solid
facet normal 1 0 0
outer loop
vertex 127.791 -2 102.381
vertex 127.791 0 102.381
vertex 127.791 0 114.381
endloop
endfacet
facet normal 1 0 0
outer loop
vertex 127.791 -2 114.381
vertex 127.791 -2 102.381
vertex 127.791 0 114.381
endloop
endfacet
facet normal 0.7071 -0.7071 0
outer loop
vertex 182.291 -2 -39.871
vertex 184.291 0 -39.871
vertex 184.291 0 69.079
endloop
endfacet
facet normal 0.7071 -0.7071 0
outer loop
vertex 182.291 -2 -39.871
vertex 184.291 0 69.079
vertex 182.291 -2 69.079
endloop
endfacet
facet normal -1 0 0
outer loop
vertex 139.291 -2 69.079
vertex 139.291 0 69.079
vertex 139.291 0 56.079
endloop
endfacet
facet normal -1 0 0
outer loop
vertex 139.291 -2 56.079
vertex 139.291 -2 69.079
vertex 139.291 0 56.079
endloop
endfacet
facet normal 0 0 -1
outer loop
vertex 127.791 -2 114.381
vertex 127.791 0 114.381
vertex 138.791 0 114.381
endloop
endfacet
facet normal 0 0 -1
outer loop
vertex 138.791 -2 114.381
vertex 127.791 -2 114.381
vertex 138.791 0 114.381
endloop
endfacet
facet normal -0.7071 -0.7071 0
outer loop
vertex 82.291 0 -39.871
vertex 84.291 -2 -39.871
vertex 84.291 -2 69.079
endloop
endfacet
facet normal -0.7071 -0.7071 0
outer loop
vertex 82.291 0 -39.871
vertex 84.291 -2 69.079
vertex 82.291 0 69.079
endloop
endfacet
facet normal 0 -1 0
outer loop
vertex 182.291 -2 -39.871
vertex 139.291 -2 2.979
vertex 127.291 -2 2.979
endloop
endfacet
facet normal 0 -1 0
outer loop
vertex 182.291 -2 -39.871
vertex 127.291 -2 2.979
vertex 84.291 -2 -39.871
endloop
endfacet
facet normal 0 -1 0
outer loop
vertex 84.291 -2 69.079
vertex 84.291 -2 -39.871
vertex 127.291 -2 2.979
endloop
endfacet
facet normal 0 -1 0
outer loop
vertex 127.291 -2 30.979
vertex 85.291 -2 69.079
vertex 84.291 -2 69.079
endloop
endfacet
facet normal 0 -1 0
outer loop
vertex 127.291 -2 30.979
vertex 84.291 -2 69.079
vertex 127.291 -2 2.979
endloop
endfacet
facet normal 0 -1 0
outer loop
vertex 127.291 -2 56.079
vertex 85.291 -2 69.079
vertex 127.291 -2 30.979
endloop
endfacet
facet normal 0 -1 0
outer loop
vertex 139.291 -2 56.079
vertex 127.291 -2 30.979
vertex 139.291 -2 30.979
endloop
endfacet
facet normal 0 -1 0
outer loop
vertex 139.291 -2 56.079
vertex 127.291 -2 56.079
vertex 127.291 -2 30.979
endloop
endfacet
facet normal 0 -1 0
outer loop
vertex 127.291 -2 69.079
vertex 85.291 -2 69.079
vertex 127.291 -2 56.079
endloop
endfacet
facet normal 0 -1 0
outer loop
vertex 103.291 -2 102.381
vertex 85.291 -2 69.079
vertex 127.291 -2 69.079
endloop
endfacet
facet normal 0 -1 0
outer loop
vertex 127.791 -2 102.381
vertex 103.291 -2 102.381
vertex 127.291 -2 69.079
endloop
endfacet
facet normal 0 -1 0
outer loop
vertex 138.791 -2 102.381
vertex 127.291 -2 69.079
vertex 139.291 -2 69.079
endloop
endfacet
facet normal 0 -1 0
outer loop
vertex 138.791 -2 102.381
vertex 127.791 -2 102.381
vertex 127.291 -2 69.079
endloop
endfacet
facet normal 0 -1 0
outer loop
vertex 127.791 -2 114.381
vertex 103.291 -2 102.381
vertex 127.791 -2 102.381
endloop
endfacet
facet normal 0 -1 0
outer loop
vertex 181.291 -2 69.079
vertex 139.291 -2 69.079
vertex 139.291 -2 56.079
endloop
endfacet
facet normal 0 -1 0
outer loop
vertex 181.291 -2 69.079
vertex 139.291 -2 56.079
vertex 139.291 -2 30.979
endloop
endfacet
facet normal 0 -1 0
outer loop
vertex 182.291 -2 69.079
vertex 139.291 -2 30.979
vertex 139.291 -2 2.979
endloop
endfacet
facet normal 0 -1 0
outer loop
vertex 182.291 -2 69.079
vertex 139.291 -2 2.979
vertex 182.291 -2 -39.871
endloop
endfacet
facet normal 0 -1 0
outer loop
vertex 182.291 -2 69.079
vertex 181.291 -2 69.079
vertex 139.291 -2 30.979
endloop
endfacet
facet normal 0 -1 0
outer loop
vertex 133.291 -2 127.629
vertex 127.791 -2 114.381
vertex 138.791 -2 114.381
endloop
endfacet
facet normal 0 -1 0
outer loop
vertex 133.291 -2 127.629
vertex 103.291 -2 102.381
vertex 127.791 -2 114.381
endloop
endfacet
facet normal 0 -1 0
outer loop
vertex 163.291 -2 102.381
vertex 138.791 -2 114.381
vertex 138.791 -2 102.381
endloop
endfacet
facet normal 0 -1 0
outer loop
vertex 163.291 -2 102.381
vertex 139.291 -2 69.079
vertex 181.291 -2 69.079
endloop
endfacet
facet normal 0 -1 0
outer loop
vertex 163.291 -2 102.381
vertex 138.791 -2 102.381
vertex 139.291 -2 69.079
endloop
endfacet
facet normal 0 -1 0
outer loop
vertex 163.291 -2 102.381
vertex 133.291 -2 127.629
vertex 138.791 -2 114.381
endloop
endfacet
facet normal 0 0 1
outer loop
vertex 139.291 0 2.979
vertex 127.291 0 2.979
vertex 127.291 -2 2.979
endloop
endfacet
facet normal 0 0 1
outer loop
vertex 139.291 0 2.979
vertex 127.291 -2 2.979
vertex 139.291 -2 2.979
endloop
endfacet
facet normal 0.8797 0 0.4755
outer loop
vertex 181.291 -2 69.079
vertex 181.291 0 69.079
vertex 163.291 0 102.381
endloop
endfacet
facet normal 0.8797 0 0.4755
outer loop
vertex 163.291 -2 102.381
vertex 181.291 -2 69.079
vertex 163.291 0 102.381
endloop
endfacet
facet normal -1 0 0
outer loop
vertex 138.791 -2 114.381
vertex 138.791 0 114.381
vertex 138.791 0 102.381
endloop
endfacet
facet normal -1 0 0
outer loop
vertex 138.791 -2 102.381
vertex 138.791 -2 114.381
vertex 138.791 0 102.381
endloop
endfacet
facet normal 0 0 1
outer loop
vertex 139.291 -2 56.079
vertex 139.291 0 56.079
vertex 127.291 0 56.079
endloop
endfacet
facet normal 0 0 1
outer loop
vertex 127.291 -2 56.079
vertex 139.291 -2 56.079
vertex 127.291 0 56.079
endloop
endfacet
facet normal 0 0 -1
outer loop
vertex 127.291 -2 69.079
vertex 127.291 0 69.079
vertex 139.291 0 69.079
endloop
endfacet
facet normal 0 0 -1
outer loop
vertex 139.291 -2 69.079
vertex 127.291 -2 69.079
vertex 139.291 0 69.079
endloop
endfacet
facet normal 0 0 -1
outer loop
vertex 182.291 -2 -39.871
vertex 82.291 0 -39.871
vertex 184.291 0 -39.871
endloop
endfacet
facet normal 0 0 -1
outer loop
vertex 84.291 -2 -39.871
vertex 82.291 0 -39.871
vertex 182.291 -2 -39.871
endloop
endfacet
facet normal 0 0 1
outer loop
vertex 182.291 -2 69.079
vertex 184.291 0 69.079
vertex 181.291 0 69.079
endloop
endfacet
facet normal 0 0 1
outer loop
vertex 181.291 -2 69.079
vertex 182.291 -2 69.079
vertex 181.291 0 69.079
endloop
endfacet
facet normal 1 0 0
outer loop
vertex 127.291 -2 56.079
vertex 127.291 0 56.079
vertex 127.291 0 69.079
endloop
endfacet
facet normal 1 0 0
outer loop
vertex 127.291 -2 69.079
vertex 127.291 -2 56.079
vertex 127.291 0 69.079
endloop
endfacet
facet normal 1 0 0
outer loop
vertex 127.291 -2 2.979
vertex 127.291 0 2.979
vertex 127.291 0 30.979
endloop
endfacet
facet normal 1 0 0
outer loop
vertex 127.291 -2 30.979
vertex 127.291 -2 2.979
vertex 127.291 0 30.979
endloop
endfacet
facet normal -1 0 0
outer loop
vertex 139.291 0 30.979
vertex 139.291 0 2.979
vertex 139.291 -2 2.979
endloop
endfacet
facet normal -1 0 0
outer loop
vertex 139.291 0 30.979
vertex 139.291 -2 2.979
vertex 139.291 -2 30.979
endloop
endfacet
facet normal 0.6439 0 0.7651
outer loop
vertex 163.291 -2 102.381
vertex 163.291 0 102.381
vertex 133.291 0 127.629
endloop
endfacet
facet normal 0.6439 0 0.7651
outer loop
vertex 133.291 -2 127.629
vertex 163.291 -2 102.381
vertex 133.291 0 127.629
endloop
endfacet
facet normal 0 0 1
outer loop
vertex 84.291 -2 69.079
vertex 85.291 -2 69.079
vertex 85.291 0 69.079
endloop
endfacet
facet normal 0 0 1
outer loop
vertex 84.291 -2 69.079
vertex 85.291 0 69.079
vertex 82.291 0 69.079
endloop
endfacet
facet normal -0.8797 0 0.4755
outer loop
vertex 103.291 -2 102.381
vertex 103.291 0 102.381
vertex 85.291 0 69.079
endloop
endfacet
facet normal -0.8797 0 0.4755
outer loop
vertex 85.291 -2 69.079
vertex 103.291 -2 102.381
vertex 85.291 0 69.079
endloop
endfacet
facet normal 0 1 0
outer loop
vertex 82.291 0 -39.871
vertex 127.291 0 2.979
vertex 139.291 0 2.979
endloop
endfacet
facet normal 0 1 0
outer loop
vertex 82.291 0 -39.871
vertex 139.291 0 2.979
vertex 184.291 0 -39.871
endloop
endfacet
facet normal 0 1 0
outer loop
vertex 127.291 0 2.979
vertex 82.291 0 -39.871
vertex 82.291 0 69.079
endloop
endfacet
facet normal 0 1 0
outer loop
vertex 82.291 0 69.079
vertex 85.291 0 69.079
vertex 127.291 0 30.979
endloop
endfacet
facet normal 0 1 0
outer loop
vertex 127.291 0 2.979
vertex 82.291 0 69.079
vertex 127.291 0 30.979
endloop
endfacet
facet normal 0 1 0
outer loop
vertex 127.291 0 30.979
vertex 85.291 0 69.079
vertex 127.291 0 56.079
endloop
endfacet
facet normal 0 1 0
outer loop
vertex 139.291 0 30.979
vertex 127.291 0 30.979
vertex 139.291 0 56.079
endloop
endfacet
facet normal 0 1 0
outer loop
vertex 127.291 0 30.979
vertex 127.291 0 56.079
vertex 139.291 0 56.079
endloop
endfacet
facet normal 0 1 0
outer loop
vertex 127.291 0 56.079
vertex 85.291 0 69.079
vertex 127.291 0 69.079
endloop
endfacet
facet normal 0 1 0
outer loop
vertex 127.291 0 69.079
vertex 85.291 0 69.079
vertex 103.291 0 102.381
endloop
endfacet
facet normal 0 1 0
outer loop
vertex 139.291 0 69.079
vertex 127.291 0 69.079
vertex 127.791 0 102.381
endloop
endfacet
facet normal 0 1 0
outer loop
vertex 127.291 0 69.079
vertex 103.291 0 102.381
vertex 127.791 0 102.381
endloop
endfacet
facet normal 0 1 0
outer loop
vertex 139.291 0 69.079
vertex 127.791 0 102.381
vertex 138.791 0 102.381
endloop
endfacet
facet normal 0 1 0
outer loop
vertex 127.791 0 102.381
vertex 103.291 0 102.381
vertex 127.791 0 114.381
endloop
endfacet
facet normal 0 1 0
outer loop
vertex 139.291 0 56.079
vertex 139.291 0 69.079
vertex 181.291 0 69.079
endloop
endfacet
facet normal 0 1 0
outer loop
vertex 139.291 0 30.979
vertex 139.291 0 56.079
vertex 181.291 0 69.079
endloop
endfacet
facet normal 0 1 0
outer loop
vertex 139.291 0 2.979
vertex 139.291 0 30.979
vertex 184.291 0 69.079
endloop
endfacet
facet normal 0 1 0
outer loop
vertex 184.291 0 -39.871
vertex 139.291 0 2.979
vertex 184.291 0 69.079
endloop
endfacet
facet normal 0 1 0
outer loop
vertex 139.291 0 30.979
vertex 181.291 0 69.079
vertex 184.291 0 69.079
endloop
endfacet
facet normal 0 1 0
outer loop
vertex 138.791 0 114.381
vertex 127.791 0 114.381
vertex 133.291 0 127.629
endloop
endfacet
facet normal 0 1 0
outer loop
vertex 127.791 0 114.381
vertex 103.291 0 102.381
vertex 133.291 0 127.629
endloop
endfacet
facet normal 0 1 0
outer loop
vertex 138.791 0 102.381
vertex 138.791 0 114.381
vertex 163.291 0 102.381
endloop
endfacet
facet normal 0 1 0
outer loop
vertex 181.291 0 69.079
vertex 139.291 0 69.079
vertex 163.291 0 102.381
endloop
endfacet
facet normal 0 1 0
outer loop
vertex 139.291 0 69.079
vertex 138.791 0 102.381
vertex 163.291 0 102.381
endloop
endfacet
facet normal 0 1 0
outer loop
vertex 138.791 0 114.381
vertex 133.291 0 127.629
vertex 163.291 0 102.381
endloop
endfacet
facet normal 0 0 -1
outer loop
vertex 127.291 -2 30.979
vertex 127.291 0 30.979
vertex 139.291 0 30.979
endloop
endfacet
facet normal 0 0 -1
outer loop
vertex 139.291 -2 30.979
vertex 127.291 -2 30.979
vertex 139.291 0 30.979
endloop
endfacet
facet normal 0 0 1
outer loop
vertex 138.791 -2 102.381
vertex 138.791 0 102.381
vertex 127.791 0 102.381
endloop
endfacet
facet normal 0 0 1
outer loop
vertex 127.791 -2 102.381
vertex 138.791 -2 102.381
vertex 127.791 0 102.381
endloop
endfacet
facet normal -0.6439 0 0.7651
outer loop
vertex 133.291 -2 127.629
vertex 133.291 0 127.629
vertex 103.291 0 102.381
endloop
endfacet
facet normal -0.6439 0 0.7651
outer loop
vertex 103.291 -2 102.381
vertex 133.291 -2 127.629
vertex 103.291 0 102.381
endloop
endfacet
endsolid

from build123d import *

# Parameters (mm, degrees)
F0_W     = 12
F0_H     = 28
F1_DEPTH = 2
F3_DEPTH = 250
F5_DEPTH = 250


with BuildPart() as f1:
    # F0 (on Front) → F1 (new body)
    with BuildSketch(Plane.XZ):
        Polygon((85.290909, -39.870985), (133.290909, -39.870985), (184.290909, -39.870985), (184.290909, -11.236302), (184.290909, 69.079015), (181.290909, 69.079015), (163.290909, 102.380682), (133.290909, 127.629015), (103.290909, 102.380682), (85.290909, 69.079015), (82.290909, 69.079015), (82.290909, -39.870985), align=None)
        with Locations((133.290909, 16.979015)):
            Rectangle(F0_W, F0_H, mode=Mode.SUBTRACT)
        Polygon((133.290909, 69.079015), (139.290909, 69.079015), (139.290909, 56.079015), (127.290909, 56.079015), (127.290909, 69.079015), align=None, mode=Mode.SUBTRACT)
        Polygon((138.790909, 114.380682), (138.790909, 102.380682), (133.290909, 102.380682), (127.790909, 102.380682), (127.790909, 114.380682), align=None, mode=Mode.SUBTRACT)
    extrude(amount=F1_DEPTH)

    # F2 (on face) → F3 (cut)
    with BuildSketch(Plane.XY.offset(69.079015)):
        Polygon((182.290909, -2), (184.290909, -2), (184.290909, 0), align=None)
    extrude(amount=-F3_DEPTH, mode=Mode.SUBTRACT)

    # F4 (on face) → F5 (cut)
    with BuildSketch(Plane.XY.offset(69.079015)):
        Polygon((82.290909, 0), (82.290909, -2), (84.290909, -2), align=None)
    extrude(amount=-F5_DEPTH, mode=Mode.SUBTRACT)


solid = f1.part
